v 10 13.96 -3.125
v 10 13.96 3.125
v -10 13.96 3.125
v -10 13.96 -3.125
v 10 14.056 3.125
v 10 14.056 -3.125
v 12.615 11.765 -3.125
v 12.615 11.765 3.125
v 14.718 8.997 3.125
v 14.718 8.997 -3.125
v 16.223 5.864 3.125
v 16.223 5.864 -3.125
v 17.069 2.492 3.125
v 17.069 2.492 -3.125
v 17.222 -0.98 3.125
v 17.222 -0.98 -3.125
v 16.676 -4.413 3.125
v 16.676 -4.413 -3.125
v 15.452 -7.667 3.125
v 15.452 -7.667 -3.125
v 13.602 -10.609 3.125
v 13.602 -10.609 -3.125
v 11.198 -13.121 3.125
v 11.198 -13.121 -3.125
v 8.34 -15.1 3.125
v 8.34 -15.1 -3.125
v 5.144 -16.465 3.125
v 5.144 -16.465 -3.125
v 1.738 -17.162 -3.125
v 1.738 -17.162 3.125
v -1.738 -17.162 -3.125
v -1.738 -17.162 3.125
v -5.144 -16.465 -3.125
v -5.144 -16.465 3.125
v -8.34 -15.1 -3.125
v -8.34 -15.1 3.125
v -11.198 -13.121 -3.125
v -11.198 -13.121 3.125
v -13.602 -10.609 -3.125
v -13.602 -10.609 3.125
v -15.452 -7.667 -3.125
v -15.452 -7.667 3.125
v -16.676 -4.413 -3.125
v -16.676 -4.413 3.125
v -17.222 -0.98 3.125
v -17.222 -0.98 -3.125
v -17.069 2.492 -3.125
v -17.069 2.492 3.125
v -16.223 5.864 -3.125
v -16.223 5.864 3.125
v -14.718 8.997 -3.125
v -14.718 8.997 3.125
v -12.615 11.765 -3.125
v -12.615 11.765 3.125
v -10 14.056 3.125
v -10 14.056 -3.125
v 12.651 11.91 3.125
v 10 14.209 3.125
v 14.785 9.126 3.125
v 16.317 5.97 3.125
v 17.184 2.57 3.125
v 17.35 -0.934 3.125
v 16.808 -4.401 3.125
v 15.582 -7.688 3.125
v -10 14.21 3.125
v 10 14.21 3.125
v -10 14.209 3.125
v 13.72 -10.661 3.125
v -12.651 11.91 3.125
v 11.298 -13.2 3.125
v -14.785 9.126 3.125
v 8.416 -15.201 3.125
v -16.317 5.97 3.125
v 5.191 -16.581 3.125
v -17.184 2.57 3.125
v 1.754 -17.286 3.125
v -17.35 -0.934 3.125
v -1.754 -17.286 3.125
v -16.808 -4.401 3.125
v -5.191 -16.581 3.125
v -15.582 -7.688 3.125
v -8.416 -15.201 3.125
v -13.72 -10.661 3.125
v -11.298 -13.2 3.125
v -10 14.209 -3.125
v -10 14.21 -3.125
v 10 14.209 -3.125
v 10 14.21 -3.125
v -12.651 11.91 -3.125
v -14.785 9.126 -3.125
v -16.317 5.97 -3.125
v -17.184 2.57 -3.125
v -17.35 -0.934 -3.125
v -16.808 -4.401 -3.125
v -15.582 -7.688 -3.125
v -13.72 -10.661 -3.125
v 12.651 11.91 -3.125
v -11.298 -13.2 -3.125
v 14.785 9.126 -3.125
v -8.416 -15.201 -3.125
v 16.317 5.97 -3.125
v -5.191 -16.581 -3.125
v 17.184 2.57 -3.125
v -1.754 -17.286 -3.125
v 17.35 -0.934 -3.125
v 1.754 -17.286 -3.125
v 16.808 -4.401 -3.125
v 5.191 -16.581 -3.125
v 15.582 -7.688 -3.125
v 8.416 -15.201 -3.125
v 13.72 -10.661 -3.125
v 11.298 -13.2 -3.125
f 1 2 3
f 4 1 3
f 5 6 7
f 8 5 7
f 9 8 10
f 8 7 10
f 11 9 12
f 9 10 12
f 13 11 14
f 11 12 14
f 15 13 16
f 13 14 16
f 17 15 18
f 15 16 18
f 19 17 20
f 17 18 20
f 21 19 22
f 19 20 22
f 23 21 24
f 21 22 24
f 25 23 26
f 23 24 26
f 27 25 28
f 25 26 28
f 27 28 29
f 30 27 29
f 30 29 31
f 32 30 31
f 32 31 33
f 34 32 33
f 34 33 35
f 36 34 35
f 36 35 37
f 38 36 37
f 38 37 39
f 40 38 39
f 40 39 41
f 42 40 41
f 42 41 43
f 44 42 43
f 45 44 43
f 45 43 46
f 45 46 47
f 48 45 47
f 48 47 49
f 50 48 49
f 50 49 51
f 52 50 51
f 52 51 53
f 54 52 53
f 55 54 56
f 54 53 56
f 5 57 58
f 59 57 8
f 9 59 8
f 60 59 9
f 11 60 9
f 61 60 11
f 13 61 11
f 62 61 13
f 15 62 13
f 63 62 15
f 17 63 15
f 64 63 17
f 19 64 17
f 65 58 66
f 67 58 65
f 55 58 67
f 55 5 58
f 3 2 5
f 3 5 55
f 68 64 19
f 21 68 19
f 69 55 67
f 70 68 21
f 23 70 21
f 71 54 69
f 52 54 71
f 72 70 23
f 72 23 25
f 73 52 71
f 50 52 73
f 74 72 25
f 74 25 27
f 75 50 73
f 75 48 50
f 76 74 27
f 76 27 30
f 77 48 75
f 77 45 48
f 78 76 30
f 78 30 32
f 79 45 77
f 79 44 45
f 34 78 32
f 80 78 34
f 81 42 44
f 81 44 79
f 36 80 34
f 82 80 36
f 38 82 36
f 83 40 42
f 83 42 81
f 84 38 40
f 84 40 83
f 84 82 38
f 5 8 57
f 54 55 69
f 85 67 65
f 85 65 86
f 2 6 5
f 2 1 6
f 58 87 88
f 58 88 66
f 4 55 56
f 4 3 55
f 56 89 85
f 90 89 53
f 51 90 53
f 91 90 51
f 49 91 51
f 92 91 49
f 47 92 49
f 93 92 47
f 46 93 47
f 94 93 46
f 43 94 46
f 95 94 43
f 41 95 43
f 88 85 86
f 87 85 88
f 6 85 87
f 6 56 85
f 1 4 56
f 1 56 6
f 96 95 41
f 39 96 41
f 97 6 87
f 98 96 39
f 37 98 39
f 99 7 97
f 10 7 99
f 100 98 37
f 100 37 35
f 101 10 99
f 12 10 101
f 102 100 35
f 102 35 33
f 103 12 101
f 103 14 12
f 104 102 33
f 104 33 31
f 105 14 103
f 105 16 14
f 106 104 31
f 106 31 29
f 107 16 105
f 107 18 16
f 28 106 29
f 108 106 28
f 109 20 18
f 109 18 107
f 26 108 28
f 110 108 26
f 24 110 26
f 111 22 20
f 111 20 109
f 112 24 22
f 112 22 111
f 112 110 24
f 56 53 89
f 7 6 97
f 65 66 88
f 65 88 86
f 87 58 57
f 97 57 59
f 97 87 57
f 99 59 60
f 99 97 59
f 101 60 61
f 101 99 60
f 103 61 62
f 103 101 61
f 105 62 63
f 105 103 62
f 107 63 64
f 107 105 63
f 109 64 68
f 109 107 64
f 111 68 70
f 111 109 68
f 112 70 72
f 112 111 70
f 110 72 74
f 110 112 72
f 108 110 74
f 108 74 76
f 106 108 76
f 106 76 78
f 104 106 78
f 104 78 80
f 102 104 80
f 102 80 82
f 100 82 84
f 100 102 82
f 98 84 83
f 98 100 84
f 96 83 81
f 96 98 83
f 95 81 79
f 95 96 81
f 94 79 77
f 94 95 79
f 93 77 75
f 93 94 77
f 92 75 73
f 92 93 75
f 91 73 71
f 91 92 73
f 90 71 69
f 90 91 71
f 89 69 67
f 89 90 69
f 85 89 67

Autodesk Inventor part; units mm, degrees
sketch "Sketch3" plane through (0, 0, 0) normal (0, 0, 1) x (1, 0, 0)
  circle A0 centre (0, 0) radius 17.25
  circle A1 centre (0, 0) radius 17.375
  dimension "d8" = 34.5
  dimension "d9" = 34.75
extrude "Extrusion3" add sketch "Sketch3" along normal mid plane 6.25
sketch "Sketch4" plane through (0, 0, 3.125) normal (0, 0, 1) x (1, 0, 0)
  circle A0 centre (0, 0) radius 17.375
  circle A1 centre (0, 0) radius 17.625
  dimension "d12" = 34.75
  dimension "d13" = 0.25
extrude "Extrusion4" cut sketch "Sketch4" along normal blind 0.25 and the other way blind 5.75
ref_plane "Work Plane4" through (0, 17.5, 0) normal (0, 1, 0) x (-1, 0, 0)
sketch "Sketch6" plane through (0, 17.5, 0) normal (0, 1, 0) x (-1, 0, 0)
  line L0 (-10, 3.75) -> (10, 3.75)
  line L1 (10, 3.75) -> (10, -3.75)
  line L2 (10, -3.75) -> (-10, -3.75)
  line L3 (-10, -3.75) -> (-10, 3.75)
  line L4 (-10, 3.75) -> (10, -3.75) construction
  line L5 (10, 3.75) -> (-10, -3.75) construction
  point P0 (0, 0)
  dimension "d19" = 20
  dimension "d20" = 7.5
extrude "Extrusion5" cut sketch "Sketch6" against normal blind 10
ref_plane "Work Plane3" through (0, 17.5, 0) normal (0, 1, 0) x (-1, 0, 0)
sketch "Sketch7" plane through (0, 17.5, 0) normal (0, 1, 0) x (-1, 0, 0)
  point P0 (0, 0)
sketch "Sketch8" plane through (10, 14.0557, -3.125) normal (-1, 0, 0) x (0, 0, 1)
  line L0 (6.25, 0) -> (0, 0)
  line L1 (0, 0) -> (0, 0.1531)
  line L2 (0, 0.1531) -> (6.25, 0.1531)
  line L3 (6.25, 0.1531) -> (0, 0.1531) projected
  point P0 (3.125, 0.1531)
  point P1 (3.125, 0.1531)
ref_plane "Work Plane5" through (0, 13.96, 0) normal (0, 1, 0) x (-1, 0, 0)
sketch "Sketch9" plane through (0, 13.96, 0) normal (0, 1, 0) x (-1, 0, 0)
  line L0 (-10, -3.125) -> (-10, 3.125) projected
  line L1 (10, -3.125) -> (-10, -3.125)
  line L2 (-10, -3.125) -> (-10, 3.125)
  line L3 (-10, 3.125) -> (10, 3.125)
  line L4 (10, 3.125) -> (10, -3.125)
  point P0 (0, 0)
extrude "Extrusion6" add sketch "Sketch9" along normal blind 0.25
properties part number "Small_Ring" material "Iron, Cast"
